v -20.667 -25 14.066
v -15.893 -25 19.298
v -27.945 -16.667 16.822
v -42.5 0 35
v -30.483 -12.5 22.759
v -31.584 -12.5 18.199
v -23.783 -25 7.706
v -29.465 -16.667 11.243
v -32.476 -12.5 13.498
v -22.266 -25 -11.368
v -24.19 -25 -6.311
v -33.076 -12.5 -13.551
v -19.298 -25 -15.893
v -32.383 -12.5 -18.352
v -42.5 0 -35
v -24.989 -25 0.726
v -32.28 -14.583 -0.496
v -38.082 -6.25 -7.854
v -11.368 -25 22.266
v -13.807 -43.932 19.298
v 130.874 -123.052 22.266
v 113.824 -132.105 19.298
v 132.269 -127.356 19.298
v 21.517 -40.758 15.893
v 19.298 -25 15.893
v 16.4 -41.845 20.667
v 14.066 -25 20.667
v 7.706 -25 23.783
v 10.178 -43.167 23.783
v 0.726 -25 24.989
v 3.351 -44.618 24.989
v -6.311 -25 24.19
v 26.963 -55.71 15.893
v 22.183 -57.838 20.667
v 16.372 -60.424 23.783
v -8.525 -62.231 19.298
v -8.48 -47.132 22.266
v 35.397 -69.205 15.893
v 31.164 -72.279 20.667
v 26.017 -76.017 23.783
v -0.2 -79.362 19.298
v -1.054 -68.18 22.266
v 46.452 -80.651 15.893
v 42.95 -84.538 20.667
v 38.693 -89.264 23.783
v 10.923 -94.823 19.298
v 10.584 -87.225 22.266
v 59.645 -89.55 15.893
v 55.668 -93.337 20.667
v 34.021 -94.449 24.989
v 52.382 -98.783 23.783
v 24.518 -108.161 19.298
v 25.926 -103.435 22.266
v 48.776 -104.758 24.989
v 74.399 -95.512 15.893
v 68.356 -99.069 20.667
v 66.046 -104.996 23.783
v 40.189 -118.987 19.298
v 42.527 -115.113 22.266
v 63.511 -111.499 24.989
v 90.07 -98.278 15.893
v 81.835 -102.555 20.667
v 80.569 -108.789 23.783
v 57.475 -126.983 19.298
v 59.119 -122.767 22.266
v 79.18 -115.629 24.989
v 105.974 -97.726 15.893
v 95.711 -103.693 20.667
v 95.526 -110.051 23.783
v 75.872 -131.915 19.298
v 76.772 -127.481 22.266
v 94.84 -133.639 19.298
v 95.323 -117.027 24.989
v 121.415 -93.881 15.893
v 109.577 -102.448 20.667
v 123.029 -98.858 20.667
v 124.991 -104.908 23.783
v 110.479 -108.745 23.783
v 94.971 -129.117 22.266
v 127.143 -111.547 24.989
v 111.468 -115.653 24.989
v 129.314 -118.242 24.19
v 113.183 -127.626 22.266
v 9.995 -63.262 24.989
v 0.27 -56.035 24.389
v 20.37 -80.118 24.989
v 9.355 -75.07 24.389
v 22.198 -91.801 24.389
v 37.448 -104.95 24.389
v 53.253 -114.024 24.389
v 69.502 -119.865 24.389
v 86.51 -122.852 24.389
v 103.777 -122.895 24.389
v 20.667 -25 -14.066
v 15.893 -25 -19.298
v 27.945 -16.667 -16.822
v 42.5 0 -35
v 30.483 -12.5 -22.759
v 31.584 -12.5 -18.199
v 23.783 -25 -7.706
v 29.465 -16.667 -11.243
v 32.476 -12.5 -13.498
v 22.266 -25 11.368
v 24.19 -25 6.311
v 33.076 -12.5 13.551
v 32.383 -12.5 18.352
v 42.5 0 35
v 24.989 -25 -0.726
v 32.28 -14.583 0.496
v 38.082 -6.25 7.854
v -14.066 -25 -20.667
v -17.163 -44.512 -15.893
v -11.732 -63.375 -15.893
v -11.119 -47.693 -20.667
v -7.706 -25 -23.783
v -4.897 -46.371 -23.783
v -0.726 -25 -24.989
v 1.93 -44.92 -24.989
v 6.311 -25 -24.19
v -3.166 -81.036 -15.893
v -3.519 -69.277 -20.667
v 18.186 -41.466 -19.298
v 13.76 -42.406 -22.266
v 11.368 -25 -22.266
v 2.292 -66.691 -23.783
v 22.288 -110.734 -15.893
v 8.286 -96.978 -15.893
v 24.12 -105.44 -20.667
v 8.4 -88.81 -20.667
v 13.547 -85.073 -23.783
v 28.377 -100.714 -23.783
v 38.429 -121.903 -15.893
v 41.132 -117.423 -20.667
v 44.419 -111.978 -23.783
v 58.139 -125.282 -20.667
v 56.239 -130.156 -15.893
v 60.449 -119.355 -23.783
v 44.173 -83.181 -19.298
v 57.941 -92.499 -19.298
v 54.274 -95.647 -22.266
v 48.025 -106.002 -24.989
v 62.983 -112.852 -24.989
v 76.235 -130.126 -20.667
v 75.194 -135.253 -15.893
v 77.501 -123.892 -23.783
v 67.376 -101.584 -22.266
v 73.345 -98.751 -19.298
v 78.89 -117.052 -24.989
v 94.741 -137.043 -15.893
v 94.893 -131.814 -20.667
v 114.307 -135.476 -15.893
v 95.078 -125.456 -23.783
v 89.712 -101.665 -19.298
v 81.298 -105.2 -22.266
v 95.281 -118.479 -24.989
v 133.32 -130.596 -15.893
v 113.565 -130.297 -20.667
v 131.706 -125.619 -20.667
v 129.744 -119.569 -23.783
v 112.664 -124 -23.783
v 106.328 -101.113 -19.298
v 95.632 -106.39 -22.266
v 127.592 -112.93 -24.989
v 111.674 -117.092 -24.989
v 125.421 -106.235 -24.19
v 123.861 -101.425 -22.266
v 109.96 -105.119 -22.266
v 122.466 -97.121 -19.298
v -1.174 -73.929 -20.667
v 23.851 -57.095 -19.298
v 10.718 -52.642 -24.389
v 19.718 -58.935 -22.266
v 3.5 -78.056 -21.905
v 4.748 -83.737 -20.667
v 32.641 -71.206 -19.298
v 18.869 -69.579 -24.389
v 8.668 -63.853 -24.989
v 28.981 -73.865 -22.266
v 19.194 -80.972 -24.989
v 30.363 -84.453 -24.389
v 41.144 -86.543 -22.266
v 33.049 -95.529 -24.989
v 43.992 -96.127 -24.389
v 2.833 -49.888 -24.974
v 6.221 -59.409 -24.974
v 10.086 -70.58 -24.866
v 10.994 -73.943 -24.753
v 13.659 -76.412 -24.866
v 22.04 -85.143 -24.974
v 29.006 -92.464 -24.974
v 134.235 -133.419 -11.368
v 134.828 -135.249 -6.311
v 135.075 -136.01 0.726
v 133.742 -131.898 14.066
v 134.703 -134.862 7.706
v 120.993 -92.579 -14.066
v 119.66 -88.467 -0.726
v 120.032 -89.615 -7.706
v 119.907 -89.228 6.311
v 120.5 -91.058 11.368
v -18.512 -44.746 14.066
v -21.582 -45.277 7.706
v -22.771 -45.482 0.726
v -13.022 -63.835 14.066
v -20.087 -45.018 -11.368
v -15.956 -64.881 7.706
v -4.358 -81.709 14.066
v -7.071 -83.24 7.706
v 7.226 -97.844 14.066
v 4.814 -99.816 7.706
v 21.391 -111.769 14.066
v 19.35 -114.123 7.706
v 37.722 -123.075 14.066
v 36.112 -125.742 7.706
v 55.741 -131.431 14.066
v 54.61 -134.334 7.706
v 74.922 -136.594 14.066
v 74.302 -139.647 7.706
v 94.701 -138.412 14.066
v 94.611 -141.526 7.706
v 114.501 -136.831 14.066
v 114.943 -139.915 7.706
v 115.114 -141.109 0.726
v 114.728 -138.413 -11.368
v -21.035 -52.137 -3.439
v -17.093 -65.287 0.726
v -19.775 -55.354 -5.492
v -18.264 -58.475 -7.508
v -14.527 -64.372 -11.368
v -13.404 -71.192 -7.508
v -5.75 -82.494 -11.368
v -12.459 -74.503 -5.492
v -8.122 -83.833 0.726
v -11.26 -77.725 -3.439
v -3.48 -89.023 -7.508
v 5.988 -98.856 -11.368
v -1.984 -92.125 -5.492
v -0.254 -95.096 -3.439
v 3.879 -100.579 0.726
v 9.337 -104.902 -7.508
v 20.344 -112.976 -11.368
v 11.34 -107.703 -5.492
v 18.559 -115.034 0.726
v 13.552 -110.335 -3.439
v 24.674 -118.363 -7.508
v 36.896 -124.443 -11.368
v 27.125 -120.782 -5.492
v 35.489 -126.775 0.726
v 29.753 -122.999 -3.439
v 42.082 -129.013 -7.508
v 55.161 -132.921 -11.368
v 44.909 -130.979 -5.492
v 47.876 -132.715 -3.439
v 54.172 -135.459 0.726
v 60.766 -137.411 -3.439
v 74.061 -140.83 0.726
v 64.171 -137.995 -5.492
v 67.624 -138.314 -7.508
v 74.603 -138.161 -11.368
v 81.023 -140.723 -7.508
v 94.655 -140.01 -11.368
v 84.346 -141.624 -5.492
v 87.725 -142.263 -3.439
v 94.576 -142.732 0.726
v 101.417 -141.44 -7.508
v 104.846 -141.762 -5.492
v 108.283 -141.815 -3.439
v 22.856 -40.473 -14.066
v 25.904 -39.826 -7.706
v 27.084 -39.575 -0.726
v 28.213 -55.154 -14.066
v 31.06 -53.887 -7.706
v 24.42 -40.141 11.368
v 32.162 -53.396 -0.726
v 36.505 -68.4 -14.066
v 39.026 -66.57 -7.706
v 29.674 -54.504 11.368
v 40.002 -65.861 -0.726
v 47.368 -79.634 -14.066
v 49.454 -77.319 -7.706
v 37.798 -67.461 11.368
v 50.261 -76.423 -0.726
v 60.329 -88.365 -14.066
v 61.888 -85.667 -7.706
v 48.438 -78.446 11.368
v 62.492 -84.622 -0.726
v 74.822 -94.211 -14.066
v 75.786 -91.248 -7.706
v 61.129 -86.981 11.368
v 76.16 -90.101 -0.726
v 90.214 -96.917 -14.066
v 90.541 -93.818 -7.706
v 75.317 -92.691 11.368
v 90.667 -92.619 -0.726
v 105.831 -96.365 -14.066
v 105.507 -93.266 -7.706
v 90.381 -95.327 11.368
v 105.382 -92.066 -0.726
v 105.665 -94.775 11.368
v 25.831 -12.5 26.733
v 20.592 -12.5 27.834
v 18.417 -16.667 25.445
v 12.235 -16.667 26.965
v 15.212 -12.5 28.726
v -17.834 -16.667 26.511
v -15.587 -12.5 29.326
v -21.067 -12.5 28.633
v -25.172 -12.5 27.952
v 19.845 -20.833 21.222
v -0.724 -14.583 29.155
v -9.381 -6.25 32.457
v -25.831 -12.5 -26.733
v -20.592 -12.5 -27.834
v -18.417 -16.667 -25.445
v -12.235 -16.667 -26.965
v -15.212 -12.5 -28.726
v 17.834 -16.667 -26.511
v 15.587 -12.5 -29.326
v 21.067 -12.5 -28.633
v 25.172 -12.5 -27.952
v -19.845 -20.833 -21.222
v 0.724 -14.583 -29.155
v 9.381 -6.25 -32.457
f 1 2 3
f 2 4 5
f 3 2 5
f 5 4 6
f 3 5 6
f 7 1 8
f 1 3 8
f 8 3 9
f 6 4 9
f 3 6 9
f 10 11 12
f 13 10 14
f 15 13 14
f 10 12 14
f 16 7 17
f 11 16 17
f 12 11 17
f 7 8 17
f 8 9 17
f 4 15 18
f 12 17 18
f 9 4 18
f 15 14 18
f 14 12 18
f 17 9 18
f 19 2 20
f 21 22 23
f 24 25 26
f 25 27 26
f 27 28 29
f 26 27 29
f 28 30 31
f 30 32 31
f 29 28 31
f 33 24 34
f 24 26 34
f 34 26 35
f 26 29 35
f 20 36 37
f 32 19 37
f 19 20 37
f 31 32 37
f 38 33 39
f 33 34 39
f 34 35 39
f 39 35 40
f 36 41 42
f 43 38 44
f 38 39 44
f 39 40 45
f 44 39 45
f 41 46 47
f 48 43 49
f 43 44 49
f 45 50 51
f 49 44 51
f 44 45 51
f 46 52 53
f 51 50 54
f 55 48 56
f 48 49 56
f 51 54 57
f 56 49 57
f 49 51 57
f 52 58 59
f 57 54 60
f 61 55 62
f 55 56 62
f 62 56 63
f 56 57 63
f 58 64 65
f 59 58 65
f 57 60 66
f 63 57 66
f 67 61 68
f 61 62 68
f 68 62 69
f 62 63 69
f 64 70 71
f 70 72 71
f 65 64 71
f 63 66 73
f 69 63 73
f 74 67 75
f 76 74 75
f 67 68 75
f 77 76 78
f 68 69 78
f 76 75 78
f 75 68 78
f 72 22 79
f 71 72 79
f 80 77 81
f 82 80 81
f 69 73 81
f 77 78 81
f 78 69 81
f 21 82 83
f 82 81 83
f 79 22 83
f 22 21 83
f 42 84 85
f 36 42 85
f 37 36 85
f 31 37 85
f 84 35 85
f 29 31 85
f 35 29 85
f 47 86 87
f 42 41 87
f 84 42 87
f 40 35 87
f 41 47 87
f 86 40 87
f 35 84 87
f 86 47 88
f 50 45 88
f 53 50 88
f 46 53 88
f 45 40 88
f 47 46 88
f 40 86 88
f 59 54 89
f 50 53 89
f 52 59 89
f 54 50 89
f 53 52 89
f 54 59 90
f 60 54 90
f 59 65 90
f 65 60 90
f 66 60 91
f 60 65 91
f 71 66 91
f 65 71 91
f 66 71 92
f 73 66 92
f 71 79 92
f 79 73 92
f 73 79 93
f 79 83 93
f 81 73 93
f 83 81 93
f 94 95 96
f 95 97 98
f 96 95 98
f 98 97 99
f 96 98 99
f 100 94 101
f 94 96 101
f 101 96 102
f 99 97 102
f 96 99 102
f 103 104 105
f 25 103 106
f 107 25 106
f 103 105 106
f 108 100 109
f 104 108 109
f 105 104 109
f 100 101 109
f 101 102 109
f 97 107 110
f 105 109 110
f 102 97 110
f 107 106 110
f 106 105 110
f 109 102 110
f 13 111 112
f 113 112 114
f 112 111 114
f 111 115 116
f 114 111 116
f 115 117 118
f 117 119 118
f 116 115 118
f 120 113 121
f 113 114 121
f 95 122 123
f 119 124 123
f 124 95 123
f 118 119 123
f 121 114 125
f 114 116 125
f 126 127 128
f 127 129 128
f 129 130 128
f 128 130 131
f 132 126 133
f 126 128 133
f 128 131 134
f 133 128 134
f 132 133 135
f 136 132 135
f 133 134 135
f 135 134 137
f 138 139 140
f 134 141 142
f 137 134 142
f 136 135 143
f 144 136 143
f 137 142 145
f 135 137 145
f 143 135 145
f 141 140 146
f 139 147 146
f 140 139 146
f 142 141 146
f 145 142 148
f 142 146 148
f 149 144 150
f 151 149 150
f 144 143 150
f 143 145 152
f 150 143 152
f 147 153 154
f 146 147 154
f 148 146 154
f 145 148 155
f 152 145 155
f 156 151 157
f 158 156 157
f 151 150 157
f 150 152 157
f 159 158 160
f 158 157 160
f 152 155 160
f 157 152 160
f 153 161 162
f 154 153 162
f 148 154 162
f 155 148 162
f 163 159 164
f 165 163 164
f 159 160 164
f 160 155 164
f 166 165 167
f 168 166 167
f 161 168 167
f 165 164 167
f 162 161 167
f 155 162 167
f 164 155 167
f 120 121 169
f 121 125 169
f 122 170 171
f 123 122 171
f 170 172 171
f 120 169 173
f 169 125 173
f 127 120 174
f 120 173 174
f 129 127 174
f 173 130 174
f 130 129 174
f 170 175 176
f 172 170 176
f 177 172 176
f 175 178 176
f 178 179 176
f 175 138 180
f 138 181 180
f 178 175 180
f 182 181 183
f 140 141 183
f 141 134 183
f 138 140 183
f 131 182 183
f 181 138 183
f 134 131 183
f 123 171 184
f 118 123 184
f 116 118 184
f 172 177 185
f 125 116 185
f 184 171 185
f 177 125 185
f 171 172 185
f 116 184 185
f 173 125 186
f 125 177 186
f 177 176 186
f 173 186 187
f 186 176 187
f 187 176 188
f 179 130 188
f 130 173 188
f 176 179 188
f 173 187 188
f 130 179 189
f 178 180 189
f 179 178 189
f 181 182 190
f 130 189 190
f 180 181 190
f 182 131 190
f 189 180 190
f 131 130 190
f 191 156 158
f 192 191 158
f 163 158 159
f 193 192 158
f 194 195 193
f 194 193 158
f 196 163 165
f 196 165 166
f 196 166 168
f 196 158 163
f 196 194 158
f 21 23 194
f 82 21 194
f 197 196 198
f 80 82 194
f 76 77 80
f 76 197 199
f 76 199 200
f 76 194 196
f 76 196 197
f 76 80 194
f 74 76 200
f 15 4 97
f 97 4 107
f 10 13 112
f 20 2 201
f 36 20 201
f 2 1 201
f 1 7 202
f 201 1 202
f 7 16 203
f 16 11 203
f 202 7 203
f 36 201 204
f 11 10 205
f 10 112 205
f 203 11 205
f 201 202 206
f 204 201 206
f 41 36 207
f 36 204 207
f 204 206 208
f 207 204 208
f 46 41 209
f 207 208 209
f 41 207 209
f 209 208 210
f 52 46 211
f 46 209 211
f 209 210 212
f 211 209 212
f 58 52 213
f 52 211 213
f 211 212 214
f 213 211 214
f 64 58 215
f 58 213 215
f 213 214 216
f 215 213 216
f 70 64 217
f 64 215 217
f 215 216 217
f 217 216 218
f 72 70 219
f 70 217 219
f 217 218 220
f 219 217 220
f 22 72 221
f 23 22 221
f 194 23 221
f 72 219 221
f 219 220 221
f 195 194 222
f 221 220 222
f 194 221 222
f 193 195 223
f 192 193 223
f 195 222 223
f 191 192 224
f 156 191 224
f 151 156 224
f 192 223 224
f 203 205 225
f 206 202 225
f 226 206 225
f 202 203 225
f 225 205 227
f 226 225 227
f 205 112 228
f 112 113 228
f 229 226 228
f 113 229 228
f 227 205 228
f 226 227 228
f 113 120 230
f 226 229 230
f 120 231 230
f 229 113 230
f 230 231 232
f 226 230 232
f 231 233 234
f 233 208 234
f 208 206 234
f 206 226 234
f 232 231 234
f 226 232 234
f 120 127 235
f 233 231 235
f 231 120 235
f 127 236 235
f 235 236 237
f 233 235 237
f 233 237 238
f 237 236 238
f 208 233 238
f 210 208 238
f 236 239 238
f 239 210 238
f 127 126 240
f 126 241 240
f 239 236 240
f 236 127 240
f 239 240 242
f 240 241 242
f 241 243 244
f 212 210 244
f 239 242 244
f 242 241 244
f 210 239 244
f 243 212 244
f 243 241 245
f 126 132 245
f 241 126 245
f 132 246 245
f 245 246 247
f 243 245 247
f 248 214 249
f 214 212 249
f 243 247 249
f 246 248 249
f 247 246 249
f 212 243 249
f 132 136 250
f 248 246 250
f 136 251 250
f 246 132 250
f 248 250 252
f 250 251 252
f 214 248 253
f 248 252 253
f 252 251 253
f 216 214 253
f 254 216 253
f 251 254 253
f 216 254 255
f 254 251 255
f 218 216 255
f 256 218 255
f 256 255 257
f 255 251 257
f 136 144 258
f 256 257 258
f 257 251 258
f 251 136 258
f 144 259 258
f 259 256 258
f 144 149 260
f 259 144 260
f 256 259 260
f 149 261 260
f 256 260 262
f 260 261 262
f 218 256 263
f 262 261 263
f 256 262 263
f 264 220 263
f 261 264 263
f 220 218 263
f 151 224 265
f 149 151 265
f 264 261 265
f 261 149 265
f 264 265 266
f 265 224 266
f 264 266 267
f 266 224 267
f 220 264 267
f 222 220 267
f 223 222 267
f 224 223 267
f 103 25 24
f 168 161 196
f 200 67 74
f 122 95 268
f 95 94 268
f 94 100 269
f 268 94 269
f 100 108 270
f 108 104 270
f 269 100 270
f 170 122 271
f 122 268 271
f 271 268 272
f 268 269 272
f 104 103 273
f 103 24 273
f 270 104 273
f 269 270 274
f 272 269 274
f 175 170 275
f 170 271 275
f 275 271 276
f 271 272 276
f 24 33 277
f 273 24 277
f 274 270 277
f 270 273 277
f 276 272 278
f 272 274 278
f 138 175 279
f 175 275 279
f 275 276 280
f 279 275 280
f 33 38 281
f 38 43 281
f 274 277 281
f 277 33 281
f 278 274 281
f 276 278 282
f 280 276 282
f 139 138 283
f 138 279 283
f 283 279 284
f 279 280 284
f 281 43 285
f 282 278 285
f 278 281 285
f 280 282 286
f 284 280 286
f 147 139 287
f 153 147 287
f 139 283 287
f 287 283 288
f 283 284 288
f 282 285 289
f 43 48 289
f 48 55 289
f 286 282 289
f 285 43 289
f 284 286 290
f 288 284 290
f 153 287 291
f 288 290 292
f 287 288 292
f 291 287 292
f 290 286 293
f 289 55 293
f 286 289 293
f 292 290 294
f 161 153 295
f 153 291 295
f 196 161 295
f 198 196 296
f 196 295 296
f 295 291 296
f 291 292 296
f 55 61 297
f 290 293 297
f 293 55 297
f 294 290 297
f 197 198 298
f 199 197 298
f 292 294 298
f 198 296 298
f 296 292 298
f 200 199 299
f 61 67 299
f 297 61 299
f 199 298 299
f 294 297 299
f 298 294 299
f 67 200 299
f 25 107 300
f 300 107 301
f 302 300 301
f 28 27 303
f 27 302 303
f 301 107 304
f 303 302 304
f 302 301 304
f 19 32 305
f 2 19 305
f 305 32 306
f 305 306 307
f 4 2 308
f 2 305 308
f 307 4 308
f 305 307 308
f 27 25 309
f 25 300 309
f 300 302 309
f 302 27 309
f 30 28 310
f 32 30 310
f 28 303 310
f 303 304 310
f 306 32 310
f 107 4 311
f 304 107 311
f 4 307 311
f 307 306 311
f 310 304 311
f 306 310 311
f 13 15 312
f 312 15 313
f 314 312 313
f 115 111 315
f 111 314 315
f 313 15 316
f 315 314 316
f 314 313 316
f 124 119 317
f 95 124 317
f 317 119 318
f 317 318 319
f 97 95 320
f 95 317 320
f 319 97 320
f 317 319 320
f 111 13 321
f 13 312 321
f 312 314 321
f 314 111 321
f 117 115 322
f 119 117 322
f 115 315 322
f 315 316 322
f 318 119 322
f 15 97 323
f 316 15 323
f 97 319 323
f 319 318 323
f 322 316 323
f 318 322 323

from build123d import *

# Parameters (mm, degrees)
F2_W = 85
F2_H = 70


# Not quite as in the source:
# - the arcs of a loft's sections are written as splines that run evenly, so that the points pair up as in the source's solid


with BuildPart() as f3:
    # F1 (on offset) → F3 section 0
    with BuildSketch(Plane.XZ.offset(25)):
        with BuildLine():
            add(Edge.make_bspline(
                [(19.2982558904, 15.8926813215), (18.2580823303, 17.155749216), (17.0935362371, 18.3163402581), (14.560337759, 20.3880814665), (13.1917480123, 21.2991804049), (10.3030475731, 22.8369111801), (8.7830083094, 23.4635049935), (5.649817047, 24.4081312041), (4.0367425227, 24.7261402436), (0.7794672203, 25.0413604342), (-0.8646530153, 25.0385637908), (-4.1208370946, 24.7122642261), (-5.7328204228, 24.3887693732), (-8.8627799509, 23.4334895626), (-10.3806787565, 22.8017282261), (-13.2641311441, 21.2541790369), (-14.6296134271, 20.3384294505), (-15.8926813215, 19.2982558904)],
                knots=[0, 0, 0, 0, 0.125, 0.125, 0.25, 0.25, 0.375, 0.375, 0.5, 0.5, 0.625, 0.625, 0.75, 0.75, 0.875, 0.875, 1, 1, 1, 1], degree=3))
            add(Edge.make_bspline(
                [(-15.8926813215, 19.2982558904), (-17.155749216, 18.2580823303), (-18.3163402581, 17.0935362371), (-20.3880814665, 14.560337759), (-21.2991804049, 13.1917480123), (-22.8369111801, 10.3030475731), (-23.4635049935, 8.7830083094), (-24.4081312041, 5.649817047), (-24.7261402436, 4.0367425227), (-25.0413604342, 0.7794672203), (-25.0385637908, -0.8646530153), (-24.7122642261, -4.1208370946), (-24.3887693732, -5.7328204228), (-23.4334895626, -8.8627799509), (-22.8017282261, -10.3806787565), (-21.2541790369, -13.2641311441), (-20.3384294505, -14.6296134271), (-19.2982558904, -15.8926813215)],
                knots=[0, 0, 0, 0, 0.125, 0.125, 0.25, 0.25, 0.375, 0.375, 0.5, 0.5, 0.625, 0.625, 0.75, 0.75, 0.875, 0.875, 1, 1, 1, 1], degree=3))
            add(Edge.make_bspline(
                [(-19.2982558904, -15.8926813215), (-18.2580823303, -17.155749216), (-17.0935362371, -18.3163402581), (-14.560337759, -20.3880814665), (-13.1917480123, -21.2991804049), (-10.3030475731, -22.8369111801), (-8.7830083094, -23.4635049935), (-5.649817047, -24.4081312041), (-4.0367425227, -24.7261402436), (-0.7794672203, -25.0413604342), (0.8646530153, -25.0385637908), (4.1208370946, -24.7122642261), (5.7328204228, -24.3887693732), (8.8627799509, -23.4334895626), (10.3806787565, -22.8017282261), (13.2641311441, -21.2541790369), (14.6296134271, -20.3384294505), (15.8926813215, -19.2982558904)],
                knots=[0, 0, 0, 0, 0.125, 0.125, 0.25, 0.25, 0.375, 0.375, 0.5, 0.5, 0.625, 0.625, 0.75, 0.75, 0.875, 0.875, 1, 1, 1, 1], degree=3))
            add(Edge.make_bspline(
                [(15.8926813215, -19.2982558904), (17.155749216, -18.2580823303), (18.3163402581, -17.0935362371), (20.3880814665, -14.560337759), (21.2991804049, -13.1917480123), (22.8369111801, -10.3030475731), (23.4635049935, -8.7830083094), (24.4081312041, -5.649817047), (24.7261402436, -4.0367425227), (25.0413604342, -0.7794672203), (25.0385637908, 0.8646530153), (24.7122642261, 4.1208370946), (24.3887693732, 5.7328204228), (23.4334895626, 8.8627799509), (22.8017282261, 10.3806787565), (21.2541790369, 13.2641311441), (20.3384294505, 14.6296134271), (19.2982558904, 15.8926813215)],
                knots=[0, 0, 0, 0, 0.125, 0.125, 0.25, 0.25, 0.375, 0.375, 0.5, 0.5, 0.625, 0.625, 0.75, 0.75, 0.875, 0.875, 1, 1, 1, 1], degree=3))
        make_face()
    # F2 (on Front) → F3 section 1
    with BuildSketch(Plane.XZ):
        Rectangle(F2_W, F2_H)
    loft(ruled=True)

    # F5: sweep along a path in F4
    with BuildLine(Plane.XY) as f5_path:
        ThreePointArc((0, -25), (41.4671421212, -101.0552801806), (127.3674694821, -112.2384496033))
    # F3_face (on face) → F5 (sweep)
    with BuildSketch(Plane.XZ.offset(25)):
        with BuildLine():
            add(Edge.make_bspline(
                [(19.2982558904, 15.8926813215), (18.2580823303, 17.155749216), (17.0935362371, 18.3163402581), (14.560337759, 20.3880814665), (13.1917480123, 21.2991804049), (10.3030475731, 22.8369111801), (8.7830083094, 23.4635049935), (5.649817047, 24.4081312041), (4.0367425227, 24.7261402436), (0.7794672203, 25.0413604342), (-0.8646530153, 25.0385637908), (-4.1208370946, 24.7122642261), (-5.7328204228, 24.3887693732), (-8.8627799509, 23.4334895626), (-10.3806787565, 22.8017282261), (-13.2641311441, 21.2541790369), (-14.6296134271, 20.3384294505), (-15.8926813215, 19.2982558904)],
                knots=[0, 0, 0, 0, 0.125, 0.125, 0.25, 0.25, 0.375, 0.375, 0.5, 0.5, 0.625, 0.625, 0.75, 0.75, 0.875, 0.875, 1, 1, 1, 1], degree=3))
            add(Edge.make_bspline(
                [(-15.8926813215, 19.2982558904), (-17.155749216, 18.2580823303), (-18.3163402581, 17.0935362371), (-20.3880814665, 14.560337759), (-21.2991804049, 13.1917480123), (-22.8369111801, 10.3030475731), (-23.4635049935, 8.7830083094), (-24.4081312041, 5.649817047), (-24.7261402436, 4.0367425227), (-25.0413604342, 0.7794672203), (-25.0385637908, -0.8646530153), (-24.7122642261, -4.1208370946), (-24.3887693732, -5.7328204228), (-23.4334895626, -8.8627799509), (-22.8017282261, -10.3806787565), (-21.2541790369, -13.2641311441), (-20.3384294505, -14.6296134271), (-19.2982558904, -15.8926813215)],
                knots=[0, 0, 0, 0, 0.125, 0.125, 0.25, 0.25, 0.375, 0.375, 0.5, 0.5, 0.625, 0.625, 0.75, 0.75, 0.875, 0.875, 1, 1, 1, 1], degree=3))
            add(Edge.make_bspline(
                [(-19.2982558904, -15.8926813215), (-18.2580823303, -17.155749216), (-17.0935362371, -18.3163402581), (-14.560337759, -20.3880814665), (-13.1917480123, -21.2991804049), (-10.3030475731, -22.8369111801), (-8.7830083094, -23.4635049935), (-5.649817047, -24.4081312041), (-4.0367425227, -24.7261402436), (-0.7794672203, -25.0413604342), (0.8646530153, -25.0385637908), (4.1208370946, -24.7122642261), (5.7328204228, -24.3887693732), (8.8627799509, -23.4334895626), (10.3806787565, -22.8017282261), (13.2641311441, -21.2541790369), (14.6296134271, -20.3384294505), (15.8926813215, -19.2982558904)],
                knots=[0, 0, 0, 0, 0.125, 0.125, 0.25, 0.25, 0.375, 0.375, 0.5, 0.5, 0.625, 0.625, 0.75, 0.75, 0.875, 0.875, 1, 1, 1, 1], degree=3))
            add(Edge.make_bspline(
                [(15.8926813215, -19.2982558904), (17.155749216, -18.2580823303), (18.3163402581, -17.0935362371), (20.3880814665, -14.560337759), (21.2991804049, -13.1917480123), (22.8369111801, -10.3030475731), (23.4635049935, -8.7830083094), (24.4081312041, -5.649817047), (24.7261402436, -4.0367425227), (25.0413604342, -0.7794672203), (25.0385637908, 0.8646530153), (24.7122642261, 4.1208370946), (24.3887693732, 5.7328204228), (23.4334895626, 8.8627799509), (22.8017282261, 10.3806787565), (21.2541790369, 13.2641311441), (20.3384294505, 14.6296134271), (19.2982558904, 15.8926813215)],
                knots=[0, 0, 0, 0, 0.125, 0.125, 0.25, 0.25, 0.375, 0.375, 0.5, 0.5, 0.625, 0.625, 0.75, 0.75, 0.875, 0.875, 1, 1, 1, 1], degree=3))
        make_face()
    sweep(path=f5_path.line)


solid = f3.part
